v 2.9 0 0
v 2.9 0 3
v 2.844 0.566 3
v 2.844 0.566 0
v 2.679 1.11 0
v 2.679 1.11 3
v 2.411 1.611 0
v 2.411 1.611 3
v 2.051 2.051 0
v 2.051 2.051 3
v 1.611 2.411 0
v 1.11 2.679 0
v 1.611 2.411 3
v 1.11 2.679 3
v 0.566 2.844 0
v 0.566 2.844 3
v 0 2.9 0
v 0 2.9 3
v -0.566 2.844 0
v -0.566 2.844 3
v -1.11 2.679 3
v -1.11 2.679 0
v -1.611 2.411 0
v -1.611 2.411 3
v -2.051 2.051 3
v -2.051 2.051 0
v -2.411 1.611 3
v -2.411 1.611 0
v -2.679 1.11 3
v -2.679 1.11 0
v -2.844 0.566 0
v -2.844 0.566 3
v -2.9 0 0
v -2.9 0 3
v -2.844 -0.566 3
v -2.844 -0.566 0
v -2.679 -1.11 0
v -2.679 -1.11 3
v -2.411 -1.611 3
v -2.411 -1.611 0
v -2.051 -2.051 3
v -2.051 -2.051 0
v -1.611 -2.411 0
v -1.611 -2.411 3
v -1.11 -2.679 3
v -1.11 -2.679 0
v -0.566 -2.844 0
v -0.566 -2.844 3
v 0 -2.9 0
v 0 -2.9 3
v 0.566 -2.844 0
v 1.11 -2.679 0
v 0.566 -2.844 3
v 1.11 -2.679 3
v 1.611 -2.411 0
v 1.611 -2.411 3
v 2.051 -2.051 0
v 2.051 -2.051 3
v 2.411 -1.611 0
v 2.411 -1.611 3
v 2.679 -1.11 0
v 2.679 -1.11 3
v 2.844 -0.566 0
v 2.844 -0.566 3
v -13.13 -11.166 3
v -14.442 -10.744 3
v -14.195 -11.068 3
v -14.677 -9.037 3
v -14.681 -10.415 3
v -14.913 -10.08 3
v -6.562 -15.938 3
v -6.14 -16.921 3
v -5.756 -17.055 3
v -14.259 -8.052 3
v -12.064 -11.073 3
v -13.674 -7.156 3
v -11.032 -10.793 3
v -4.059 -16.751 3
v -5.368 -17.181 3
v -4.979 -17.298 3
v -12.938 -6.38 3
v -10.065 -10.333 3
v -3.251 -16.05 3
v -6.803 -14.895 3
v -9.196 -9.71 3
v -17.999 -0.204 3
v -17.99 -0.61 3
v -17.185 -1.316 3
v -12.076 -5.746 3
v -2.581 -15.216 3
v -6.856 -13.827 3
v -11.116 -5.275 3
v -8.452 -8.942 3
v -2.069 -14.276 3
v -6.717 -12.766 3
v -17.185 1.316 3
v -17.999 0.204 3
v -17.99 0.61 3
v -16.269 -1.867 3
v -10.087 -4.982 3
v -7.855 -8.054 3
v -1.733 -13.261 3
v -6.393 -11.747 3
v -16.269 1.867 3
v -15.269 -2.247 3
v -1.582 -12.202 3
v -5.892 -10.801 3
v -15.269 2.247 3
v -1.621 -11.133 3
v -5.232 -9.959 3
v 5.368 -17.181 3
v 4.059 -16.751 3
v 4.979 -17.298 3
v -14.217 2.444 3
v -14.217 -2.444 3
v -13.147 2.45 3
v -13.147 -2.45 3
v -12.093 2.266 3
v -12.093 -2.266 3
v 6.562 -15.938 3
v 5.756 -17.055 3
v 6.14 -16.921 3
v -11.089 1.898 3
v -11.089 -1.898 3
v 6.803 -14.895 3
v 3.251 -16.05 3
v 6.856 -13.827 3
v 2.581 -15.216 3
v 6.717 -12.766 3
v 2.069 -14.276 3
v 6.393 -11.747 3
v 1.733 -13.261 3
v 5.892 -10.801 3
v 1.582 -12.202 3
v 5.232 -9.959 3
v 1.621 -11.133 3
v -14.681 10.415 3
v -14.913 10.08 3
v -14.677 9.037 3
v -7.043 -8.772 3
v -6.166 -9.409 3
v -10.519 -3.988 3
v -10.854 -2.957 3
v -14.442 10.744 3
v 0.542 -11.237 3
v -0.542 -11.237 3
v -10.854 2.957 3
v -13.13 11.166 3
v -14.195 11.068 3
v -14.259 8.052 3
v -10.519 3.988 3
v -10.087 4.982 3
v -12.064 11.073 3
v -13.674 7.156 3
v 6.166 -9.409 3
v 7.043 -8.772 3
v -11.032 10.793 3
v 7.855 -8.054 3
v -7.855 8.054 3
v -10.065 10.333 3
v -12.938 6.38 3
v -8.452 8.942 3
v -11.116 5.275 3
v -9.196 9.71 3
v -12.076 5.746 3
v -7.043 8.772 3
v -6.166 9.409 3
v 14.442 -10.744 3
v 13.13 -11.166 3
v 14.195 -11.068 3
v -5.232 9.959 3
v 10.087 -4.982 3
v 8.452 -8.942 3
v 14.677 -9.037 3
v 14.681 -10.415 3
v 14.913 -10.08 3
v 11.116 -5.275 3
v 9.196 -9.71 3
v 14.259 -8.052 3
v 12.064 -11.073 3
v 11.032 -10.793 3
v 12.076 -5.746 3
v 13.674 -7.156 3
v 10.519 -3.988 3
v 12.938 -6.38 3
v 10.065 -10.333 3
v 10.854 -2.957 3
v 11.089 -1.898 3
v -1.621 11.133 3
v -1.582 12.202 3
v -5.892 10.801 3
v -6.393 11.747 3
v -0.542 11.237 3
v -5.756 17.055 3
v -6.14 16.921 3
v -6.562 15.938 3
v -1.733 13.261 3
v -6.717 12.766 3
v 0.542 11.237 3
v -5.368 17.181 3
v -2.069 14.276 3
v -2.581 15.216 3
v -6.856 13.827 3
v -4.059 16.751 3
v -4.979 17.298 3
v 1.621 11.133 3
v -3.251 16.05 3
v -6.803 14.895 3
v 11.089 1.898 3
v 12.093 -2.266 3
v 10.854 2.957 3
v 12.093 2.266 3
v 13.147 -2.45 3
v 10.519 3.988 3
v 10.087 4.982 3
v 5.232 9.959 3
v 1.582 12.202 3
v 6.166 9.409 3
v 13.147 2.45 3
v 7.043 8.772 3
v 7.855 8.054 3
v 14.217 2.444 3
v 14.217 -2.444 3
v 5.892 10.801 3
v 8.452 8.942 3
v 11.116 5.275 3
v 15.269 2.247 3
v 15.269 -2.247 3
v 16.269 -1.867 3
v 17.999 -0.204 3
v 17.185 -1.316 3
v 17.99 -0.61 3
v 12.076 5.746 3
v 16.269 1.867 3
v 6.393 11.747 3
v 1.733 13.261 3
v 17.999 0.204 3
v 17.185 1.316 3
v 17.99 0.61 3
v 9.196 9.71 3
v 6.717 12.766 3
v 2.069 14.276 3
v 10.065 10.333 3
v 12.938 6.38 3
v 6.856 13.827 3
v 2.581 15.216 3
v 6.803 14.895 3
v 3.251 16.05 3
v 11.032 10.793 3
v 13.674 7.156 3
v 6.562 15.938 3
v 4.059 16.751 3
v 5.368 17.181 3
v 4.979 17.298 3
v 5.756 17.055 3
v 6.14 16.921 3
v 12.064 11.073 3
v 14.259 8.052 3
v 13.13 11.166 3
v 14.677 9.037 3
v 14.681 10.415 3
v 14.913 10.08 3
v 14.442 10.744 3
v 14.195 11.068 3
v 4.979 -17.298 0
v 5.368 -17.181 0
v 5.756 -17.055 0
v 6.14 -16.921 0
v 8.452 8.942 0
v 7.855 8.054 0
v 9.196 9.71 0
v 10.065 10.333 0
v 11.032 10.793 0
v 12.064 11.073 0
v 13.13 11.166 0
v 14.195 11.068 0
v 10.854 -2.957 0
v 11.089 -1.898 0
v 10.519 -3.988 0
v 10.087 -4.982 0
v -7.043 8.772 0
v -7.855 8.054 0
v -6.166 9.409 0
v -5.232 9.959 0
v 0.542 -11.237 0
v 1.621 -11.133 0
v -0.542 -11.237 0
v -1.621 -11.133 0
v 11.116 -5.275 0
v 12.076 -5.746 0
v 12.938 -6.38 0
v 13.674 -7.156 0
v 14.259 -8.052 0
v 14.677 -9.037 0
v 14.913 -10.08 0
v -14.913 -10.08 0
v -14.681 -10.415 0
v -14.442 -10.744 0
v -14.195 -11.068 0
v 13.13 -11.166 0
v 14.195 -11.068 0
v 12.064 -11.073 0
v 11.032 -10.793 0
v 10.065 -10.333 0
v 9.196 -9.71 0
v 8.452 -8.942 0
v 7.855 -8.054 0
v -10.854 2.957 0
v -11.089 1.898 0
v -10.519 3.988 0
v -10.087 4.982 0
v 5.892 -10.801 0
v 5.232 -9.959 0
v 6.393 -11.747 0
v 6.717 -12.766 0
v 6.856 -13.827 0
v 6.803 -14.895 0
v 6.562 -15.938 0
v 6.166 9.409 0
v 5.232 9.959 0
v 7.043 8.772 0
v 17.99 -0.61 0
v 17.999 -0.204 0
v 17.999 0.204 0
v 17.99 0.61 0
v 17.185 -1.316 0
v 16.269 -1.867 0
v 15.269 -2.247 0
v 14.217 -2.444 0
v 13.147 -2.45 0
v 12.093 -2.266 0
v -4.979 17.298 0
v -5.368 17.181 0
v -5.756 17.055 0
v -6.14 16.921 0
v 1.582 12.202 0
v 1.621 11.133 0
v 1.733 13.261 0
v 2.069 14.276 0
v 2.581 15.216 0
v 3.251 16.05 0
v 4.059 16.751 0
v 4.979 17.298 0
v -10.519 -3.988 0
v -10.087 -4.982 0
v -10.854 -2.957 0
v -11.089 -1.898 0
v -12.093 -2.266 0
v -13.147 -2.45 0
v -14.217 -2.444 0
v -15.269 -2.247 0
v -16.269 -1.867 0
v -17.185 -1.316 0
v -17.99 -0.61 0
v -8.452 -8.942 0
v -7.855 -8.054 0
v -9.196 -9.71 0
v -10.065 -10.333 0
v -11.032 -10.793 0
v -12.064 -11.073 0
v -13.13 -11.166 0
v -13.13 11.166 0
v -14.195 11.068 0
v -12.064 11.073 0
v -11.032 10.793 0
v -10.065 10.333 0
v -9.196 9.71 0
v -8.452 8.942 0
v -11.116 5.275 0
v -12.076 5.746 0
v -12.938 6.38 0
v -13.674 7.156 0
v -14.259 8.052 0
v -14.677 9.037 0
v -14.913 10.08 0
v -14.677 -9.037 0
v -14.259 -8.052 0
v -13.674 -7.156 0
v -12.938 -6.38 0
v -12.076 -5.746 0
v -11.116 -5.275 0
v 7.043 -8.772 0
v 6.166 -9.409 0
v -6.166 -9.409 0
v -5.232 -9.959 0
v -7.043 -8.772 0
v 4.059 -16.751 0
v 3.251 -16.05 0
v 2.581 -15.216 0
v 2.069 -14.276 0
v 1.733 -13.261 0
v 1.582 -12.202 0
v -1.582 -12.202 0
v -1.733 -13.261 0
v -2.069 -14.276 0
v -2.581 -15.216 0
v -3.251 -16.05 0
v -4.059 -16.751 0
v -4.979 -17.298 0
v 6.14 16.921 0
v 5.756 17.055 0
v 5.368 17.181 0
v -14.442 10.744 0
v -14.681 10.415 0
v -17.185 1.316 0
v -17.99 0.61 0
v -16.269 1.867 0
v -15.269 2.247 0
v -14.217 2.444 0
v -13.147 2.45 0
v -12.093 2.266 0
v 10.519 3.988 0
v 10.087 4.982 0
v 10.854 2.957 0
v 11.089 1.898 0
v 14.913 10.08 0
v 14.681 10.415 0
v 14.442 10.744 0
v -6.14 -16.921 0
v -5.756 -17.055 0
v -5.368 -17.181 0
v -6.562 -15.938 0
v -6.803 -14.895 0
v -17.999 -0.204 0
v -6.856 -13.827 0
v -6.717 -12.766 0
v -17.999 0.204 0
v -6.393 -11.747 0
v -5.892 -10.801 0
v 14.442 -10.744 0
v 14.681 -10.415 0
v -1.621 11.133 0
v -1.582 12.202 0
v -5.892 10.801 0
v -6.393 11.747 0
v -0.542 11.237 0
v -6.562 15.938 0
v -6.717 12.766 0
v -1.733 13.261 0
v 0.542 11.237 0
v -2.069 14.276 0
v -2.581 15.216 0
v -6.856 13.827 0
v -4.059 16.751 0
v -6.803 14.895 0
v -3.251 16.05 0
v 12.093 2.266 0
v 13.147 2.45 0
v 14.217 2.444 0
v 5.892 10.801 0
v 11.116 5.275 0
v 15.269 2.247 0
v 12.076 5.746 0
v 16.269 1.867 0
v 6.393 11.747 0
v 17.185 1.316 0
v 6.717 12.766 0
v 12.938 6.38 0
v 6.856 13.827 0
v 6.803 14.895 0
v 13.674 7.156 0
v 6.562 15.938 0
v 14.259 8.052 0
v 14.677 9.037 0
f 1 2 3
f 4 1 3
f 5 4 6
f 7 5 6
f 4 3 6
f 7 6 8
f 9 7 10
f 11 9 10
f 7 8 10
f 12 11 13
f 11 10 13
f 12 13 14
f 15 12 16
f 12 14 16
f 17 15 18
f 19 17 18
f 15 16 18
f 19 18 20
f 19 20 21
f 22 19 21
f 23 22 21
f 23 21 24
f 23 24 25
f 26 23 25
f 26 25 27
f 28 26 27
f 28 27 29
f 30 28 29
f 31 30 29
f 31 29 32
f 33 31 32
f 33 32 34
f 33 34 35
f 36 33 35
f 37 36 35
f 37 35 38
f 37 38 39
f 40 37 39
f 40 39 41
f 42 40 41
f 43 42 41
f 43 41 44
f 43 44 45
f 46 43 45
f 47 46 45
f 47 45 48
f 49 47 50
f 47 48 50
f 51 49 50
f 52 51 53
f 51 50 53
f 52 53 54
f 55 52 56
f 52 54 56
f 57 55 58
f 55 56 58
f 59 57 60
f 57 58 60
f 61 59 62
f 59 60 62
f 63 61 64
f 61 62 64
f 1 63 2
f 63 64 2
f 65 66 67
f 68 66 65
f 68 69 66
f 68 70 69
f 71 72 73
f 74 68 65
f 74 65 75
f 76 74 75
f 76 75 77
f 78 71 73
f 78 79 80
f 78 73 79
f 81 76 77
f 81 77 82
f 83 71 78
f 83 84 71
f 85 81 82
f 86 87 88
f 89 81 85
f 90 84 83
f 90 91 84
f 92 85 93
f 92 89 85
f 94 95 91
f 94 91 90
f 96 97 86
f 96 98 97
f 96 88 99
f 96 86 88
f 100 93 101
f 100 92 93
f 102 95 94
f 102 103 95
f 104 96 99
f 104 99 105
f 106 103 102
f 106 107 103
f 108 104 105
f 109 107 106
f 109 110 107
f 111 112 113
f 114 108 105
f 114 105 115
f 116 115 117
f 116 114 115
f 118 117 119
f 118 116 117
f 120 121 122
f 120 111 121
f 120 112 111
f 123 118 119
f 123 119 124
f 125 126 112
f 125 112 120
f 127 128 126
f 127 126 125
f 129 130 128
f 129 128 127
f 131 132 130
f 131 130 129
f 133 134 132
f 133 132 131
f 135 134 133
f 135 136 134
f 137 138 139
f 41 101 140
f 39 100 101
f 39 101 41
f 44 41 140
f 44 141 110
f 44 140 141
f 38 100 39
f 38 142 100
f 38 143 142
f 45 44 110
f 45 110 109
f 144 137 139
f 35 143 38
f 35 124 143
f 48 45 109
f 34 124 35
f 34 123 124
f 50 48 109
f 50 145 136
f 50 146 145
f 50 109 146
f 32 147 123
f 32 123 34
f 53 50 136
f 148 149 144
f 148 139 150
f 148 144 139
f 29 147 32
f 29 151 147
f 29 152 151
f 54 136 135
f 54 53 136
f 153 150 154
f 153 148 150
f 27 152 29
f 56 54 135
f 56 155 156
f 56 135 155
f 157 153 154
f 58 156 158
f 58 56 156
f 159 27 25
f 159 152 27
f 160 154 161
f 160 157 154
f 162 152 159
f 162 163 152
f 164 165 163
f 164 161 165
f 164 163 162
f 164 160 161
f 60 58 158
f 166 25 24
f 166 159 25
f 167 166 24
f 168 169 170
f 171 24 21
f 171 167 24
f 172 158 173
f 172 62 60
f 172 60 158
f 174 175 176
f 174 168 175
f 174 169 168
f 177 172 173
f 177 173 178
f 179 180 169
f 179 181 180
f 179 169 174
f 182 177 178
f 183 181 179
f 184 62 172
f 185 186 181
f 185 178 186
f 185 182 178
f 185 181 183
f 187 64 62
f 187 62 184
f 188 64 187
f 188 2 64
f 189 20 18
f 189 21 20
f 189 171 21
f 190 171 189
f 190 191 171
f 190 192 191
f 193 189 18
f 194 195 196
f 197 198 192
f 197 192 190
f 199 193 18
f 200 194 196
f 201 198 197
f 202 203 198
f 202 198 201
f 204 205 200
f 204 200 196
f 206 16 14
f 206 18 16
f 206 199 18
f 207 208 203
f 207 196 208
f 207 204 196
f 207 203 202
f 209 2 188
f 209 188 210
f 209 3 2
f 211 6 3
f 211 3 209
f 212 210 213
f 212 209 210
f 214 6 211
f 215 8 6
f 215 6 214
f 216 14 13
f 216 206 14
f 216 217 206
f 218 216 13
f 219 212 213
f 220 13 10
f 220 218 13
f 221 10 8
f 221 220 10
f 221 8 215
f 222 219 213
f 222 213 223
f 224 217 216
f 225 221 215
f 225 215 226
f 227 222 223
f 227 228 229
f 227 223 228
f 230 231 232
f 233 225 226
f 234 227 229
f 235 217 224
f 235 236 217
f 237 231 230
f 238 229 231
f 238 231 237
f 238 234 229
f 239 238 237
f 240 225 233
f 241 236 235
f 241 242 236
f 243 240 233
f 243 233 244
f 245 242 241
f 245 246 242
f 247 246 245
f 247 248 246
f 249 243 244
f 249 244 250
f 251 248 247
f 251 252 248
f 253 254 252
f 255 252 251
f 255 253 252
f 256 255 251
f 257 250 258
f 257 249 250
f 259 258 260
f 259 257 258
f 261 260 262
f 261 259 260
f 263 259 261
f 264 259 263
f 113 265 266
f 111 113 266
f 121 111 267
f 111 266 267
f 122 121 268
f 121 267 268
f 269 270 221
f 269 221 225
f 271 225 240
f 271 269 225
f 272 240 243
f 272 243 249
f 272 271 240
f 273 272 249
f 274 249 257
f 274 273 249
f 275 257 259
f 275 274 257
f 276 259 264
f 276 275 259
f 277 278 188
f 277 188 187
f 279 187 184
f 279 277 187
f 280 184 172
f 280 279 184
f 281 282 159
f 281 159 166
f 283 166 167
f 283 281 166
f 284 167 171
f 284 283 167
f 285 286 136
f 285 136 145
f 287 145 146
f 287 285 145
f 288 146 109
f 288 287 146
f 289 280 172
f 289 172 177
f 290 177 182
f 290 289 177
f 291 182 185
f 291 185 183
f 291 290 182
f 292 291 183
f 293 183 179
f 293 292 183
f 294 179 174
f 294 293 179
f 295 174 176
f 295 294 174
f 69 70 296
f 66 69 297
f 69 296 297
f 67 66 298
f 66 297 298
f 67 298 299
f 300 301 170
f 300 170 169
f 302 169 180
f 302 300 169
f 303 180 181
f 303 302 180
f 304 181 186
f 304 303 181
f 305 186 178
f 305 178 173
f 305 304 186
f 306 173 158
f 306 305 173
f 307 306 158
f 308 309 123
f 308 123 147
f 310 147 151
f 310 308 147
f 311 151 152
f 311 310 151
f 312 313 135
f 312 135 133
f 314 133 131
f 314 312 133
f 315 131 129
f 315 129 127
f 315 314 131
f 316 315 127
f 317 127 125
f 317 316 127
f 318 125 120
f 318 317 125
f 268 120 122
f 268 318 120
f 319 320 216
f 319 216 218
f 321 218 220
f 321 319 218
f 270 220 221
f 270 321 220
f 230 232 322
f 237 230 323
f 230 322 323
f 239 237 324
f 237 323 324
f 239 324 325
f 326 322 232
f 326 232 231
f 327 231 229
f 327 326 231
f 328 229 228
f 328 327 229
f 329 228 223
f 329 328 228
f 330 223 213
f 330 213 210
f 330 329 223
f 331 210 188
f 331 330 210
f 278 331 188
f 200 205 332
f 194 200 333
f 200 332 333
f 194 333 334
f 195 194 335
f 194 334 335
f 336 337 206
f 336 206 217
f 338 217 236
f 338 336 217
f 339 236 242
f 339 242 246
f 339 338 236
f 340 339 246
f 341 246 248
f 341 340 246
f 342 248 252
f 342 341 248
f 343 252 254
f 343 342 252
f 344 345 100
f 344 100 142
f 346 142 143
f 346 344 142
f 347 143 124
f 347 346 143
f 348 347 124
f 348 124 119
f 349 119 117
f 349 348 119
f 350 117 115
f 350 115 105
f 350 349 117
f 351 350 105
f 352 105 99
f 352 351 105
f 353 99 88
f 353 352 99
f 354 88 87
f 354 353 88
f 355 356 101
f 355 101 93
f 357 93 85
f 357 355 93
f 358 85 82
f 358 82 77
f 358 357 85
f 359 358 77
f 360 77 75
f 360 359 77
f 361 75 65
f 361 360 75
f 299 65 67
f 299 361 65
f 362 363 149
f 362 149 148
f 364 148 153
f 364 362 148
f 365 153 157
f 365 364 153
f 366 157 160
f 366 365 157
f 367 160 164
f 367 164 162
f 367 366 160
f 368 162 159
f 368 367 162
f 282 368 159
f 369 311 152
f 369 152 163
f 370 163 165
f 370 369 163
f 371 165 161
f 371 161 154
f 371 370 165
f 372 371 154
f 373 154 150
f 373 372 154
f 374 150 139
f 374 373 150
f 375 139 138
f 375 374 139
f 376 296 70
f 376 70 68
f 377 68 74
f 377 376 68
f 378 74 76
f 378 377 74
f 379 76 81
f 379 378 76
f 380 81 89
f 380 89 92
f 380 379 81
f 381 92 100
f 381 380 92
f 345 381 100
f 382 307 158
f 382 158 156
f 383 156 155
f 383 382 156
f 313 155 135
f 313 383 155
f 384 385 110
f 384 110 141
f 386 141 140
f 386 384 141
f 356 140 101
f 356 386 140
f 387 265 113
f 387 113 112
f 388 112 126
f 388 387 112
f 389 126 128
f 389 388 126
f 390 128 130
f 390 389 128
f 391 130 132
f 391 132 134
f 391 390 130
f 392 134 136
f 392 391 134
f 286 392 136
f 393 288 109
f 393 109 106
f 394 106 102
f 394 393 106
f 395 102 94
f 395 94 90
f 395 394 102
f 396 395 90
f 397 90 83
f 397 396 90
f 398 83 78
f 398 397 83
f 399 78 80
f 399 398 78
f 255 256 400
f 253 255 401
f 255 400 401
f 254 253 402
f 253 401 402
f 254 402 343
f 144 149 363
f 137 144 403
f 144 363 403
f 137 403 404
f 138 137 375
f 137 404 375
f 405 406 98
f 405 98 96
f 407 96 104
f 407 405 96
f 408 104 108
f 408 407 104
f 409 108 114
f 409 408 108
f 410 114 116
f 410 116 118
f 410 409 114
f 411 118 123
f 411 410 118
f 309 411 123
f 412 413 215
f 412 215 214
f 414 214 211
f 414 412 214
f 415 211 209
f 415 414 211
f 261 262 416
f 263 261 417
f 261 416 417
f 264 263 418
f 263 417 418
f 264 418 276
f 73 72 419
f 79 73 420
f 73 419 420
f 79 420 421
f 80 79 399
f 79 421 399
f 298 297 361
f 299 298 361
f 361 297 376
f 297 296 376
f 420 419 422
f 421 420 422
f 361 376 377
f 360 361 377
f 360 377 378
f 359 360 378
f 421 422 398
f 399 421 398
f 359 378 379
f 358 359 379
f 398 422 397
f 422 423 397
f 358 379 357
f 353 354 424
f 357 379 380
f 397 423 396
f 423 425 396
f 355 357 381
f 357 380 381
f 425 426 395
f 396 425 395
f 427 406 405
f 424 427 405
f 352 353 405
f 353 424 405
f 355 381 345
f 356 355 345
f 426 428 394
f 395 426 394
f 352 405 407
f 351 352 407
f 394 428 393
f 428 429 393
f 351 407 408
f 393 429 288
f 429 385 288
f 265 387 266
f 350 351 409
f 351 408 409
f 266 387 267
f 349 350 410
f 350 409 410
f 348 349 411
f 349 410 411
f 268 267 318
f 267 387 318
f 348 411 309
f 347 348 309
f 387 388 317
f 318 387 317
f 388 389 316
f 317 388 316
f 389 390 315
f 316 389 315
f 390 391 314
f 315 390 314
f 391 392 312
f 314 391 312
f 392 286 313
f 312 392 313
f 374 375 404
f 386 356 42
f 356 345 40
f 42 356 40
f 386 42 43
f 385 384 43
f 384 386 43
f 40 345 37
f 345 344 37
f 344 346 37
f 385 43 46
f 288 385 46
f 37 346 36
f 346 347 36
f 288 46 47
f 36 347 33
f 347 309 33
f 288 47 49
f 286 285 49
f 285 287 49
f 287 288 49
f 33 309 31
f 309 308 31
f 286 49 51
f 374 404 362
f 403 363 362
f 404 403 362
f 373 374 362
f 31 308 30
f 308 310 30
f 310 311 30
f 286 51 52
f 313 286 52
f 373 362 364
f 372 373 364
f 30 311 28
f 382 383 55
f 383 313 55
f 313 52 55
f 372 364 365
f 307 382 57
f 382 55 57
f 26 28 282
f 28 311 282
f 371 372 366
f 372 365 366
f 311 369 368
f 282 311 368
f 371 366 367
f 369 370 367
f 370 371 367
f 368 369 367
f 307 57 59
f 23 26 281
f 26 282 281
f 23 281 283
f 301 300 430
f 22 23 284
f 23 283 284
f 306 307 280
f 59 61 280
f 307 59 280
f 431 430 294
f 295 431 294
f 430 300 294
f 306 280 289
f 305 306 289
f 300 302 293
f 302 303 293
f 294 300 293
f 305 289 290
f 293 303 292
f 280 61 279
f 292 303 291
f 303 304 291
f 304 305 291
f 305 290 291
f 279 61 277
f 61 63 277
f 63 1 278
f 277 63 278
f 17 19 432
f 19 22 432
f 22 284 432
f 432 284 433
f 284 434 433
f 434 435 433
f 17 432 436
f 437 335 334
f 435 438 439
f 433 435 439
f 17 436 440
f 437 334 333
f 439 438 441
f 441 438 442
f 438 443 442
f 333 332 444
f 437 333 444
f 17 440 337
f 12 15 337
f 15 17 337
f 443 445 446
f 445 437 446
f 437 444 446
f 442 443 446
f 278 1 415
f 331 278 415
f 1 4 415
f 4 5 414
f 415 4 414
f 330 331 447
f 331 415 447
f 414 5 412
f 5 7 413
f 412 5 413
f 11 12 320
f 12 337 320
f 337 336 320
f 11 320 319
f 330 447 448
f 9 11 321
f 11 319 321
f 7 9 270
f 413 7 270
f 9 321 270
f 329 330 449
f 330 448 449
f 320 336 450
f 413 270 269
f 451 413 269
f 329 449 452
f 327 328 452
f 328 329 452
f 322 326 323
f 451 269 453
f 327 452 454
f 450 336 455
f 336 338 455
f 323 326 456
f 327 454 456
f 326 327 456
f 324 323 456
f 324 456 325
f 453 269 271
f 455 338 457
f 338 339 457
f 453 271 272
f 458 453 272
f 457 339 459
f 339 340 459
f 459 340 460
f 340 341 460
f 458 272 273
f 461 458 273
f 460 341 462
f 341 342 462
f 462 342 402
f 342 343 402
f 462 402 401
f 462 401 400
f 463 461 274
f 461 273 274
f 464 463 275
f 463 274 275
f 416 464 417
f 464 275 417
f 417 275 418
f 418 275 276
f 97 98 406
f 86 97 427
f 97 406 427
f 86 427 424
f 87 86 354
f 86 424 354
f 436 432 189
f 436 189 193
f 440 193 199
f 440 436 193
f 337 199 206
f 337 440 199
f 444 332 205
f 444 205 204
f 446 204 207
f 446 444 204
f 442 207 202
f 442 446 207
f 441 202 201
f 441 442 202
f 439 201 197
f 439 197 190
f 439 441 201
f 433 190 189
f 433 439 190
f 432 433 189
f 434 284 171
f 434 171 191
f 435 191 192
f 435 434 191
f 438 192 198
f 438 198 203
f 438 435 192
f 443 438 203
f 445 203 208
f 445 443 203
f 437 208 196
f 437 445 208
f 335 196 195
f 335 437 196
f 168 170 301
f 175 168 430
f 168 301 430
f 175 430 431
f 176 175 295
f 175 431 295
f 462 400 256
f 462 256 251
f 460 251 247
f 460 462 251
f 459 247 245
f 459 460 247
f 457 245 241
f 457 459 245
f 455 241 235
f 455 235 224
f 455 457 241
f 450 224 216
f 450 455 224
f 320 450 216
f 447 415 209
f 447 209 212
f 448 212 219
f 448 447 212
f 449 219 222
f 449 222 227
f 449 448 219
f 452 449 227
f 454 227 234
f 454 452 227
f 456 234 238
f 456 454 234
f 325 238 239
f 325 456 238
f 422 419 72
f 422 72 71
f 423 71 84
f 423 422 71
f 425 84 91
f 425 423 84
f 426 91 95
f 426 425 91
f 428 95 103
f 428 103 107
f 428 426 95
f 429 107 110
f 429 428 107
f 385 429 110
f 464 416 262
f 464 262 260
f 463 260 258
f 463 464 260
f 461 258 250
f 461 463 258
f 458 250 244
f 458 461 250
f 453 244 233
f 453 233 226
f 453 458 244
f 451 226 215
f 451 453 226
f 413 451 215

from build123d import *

# Parameters (mm, degrees)
SKETCH1_R           = 18
BOSS_EXTRUDE1_DEPTH = 3
CUT_EXTRUDE2_START  = -3
CUT_EXTRUDE2_DEPTH  = 3
CIRPATTERN1_COUNT   = 10
SKETCH5_R           = 2.9
CUT_EXTRUDE4_DEPTH  = 26.143875003


with BuildPart() as part:
    # Sketch1 → Boss-Extrude1 (new body)
    with BuildSketch(Plane.XY):
        Circle(SKETCH1_R)
    extrude(amount=BOSS_EXTRUDE1_DEPTH)

    # Sketch2 → Cut-Extrude2 (cut)
    with BuildSketch(Plane.XY.offset(3).offset(CUT_EXTRUDE2_START)):
        with BuildLine():
            ThreePointArc((-4.978508794, 17.297816342), (-2.304057127, 14.757459448), (-1.621139762, 11.132583073))
            ThreePointArc((-1.621139762, 11.132583073), (0, 11.25), (1.621139762, 11.132583073))
            ThreePointArc((1.621139762, 11.132583073), (2.304057127, 14.757459448), (4.978508794, 17.297816342))
            ThreePointArc((4.978508794, 17.297816342), (0, 18), (-4.978508794, 17.297816342))
        make_face()
    cut_extrude2 = extrude(amount=CUT_EXTRUDE2_DEPTH, mode=Mode.SUBTRACT)

    # CirPattern1: Cut-Extrude2 ×10 about axis
    cirpattern1_axis = Axis((0, 0, 0), (0, 0, 1))
    for i in range(1, CIRPATTERN1_COUNT):
        add(cut_extrude2.rotate(cirpattern1_axis, i * 360 / CIRPATTERN1_COUNT), mode=Mode.SUBTRACT)

    # Sketch5 → Cut-Extrude4 (cut, through all)
    with BuildSketch(Plane.XY.offset(3)):
        Circle(SKETCH5_R)
    extrude(amount=-CUT_EXTRUDE4_DEPTH, mode=Mode.SUBTRACT)


solid = part.part
